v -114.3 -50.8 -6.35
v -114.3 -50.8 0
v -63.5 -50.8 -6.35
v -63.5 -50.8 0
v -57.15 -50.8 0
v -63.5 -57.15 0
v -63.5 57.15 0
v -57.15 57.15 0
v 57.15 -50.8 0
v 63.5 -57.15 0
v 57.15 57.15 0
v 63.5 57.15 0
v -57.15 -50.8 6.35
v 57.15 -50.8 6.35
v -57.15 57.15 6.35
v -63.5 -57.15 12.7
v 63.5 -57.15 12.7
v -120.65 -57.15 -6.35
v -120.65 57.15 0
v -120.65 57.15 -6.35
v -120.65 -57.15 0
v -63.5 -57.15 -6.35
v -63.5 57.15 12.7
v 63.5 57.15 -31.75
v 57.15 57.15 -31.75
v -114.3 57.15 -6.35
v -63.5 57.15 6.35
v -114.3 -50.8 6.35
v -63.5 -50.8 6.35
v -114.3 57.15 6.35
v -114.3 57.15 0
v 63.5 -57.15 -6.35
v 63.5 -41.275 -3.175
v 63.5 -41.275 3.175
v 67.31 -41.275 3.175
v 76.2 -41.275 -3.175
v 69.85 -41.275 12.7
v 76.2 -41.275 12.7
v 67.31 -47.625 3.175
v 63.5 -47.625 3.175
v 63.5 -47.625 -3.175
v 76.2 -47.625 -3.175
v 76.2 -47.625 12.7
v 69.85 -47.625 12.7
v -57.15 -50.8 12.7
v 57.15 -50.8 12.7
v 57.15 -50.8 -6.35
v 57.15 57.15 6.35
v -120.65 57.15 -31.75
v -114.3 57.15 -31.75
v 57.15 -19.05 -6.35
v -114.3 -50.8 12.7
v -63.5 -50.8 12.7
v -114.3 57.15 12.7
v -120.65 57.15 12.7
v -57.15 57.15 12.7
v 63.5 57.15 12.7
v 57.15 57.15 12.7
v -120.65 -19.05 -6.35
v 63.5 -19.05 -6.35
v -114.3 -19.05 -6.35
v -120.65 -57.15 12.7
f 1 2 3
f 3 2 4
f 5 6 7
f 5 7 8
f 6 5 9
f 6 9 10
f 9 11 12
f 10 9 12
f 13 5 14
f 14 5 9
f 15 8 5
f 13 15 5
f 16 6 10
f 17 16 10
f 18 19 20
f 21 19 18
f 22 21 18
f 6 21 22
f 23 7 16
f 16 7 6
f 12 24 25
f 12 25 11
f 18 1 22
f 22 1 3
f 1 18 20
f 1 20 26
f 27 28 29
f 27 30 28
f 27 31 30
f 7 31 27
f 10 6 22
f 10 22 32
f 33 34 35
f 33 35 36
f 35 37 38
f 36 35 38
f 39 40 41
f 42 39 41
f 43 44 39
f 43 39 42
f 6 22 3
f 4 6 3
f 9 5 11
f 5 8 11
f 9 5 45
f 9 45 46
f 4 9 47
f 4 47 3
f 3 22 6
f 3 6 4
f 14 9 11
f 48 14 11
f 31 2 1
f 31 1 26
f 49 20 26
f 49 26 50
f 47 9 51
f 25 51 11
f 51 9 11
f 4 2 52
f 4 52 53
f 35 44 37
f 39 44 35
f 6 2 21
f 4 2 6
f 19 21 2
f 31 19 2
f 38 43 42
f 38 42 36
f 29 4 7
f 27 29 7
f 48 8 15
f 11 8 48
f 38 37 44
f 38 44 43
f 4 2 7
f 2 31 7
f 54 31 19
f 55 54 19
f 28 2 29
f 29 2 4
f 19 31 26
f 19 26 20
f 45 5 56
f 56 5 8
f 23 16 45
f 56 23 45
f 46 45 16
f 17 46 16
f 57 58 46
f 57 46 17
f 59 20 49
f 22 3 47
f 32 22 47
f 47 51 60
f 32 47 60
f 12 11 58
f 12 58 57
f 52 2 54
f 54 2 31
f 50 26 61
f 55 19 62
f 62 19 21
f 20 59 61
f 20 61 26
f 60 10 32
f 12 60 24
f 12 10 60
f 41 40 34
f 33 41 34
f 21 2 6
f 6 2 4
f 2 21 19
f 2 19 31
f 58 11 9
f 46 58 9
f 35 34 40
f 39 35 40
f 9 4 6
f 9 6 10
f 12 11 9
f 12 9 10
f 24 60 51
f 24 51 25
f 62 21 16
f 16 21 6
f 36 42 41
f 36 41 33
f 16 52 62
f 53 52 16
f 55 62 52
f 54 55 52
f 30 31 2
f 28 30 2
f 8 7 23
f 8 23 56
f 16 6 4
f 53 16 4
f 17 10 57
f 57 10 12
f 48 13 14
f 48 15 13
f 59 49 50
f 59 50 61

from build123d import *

# Parameters (mm, degrees)
F0_W      = 50.8
F0_H      = 101.6
F0_H_2    = 6.35
F1_DEPTH  = 6.35
F0_W_2    = 114.3
F0_W_3    = 6.35
F2_DEPTH  = 12.7
F3_DEPTH  = 12.7
F4_DEPTH  = 6.35
F5_DEPTH  = 6.35
F7_DEPTH  = 6.35
F9_DEPTH  = 6.35
F11_DEPTH = 12.7
F12_W     = 6.35
F12_H     = 6.35
F13_DEPTH = 9.525
F15_DEPTH = 6.35


# Not quite as in the source:
# - a feature names something its author has since deleted; it is built from what else it names


with BuildPart() as f1:
    # F0 (on Top) → F1 (new body)
    with BuildSketch(Plane.XY):
        with Locations((-88.9, 0)):
            Rectangle(F0_W, F0_H)
        with Locations((-88.9, 53.975)):
            Rectangle(F0_W, F0_H_2)
    extrude(amount=F1_DEPTH)


with BuildPart() as f1b:
    # F0 (on Top) → F1, piece 2 (new body)
    with BuildSketch(Plane.XY):
        Rectangle(F0_W_2, F0_H)
        with Locations((0, 53.975)):
            Rectangle(F0_W_2, F0_H_2)
    extrude(amount=F1_DEPTH)


with BuildPart() as f2:
    # F0 (on Top) → F2 (new body)
    with BuildSketch(Plane.XY):
        with Locations((-60.325, 53.975)):
            Rectangle(F0_W_3, F0_H_2)
        with Locations((-60.325, 0)):
            Rectangle(F0_W_3, F0_H)
        with Locations((-60.325, -53.975)):
            Rectangle(F0_W_3, F0_H_2)
        with Locations((0, -53.975)):
            Rectangle(F0_W_2, F0_H_2)
        with Locations((60.325, 0)):
            Rectangle(F0_W_3, F0_H)
        with Locations((60.325, 53.975)):
            Rectangle(F0_W_3, F0_H_2)
        with Locations((60.325, -53.975)):
            Rectangle(F0_W_3, F0_H_2)
    extrude(amount=F2_DEPTH)


with BuildPart() as f3:
    # F0 (on Top) → F3 (new body)
    with BuildSketch(Plane.XY):
        Polygon((-114.3, 50.8), (-114.3, 57.15), (-120.65, 57.15), (-120.65, -57.15), (-114.3, -57.15), (-114.3, -50.8), align=None)
        with Locations((-88.9, -53.975)):
            Rectangle(F0_W, F0_H_2)
    extrude(amount=F3_DEPTH)


with BuildPart() as f4:
    # F0 (on Top) → F4 (new body)
    with BuildSketch(Plane.XY):
        with Locations((-60.325, -53.975)):
            Rectangle(F0_W_3, F0_H_2)
        with Locations((0, -53.975)):
            Rectangle(F0_W_2, F0_H_2)
        with Locations((60.325, -53.975)):
            Rectangle(F0_W_3, F0_H_2)
        with Locations((60.325, 0)):
            Rectangle(F0_W_3, F0_H)
        with Locations((60.325, 53.975)):
            Rectangle(F0_W_3, F0_H_2)
    extrude(amount=-F4_DEPTH)

    # F6 (on face) → F7 (join)
    with BuildSketch(Plane.YZ.offset(63.5)):
        Polygon((57.15, -31.75), (57.15, -6.35), (-19.05, -6.35), align=None)
    extrude(amount=-F7_DEPTH)


with BuildPart() as f5:
    # F0 (on Top) → F5 (new body)
    with BuildSketch(Plane.XY):
        with Locations((-88.9, -53.975)):
            Rectangle(F0_W, F0_H_2)
        Polygon((-114.3, 50.8), (-114.3, 57.15), (-120.65, 57.15), (-120.65, -57.15), (-114.3, -57.15), (-114.3, -50.8), align=None)
    extrude(amount=-F5_DEPTH)


with BuildPart() as f9:
    # F8 (on face) → F9 (new body)
    with BuildSketch(Plane(origin=(-120.65, 0, 0), x_dir=(0, -1, 0), z_dir=(-1, 0, 0))):
        Polygon((19.05, -6.35), (-57.15, -6.35), (-57.15, -31.75), align=None)
    extrude(amount=-F9_DEPTH)


with BuildPart() as f11:
    # F10 (on face) → F11 (new body)
    with BuildSketch(Plane.YZ.offset(63.5)):
        Polygon((-47.625, 3.175), (-47.625, 0), (-44.45, 0), (-41.275, 0), (-41.275, 3.175), align=None)
        Polygon((-44.45, 0), (-47.625, 0), (-47.625, -3.175), (-41.275, -3.175), (-41.275, 0), align=None)
    extrude(amount=F11_DEPTH)

    # F12 (on face) → F13 (join)
    with BuildSketch(Plane.XY.offset(3.175)):
        with Locations((73.025, -44.45)):
            Rectangle(F12_W, F12_H)
    extrude(amount=F13_DEPTH)

    # F14 (on face) → F15 (join)
    with BuildSketch(Plane.XZ.offset(47.625)):
        Polygon((67.31, 3.175), (69.85, 3.175), (69.85, 12.7), align=None)
    extrude(amount=-F15_DEPTH)


solid = Compound([f1.part, f1b.part, f2.part, f3.part, f4.part, f5.part, f9.part, f11.part])
